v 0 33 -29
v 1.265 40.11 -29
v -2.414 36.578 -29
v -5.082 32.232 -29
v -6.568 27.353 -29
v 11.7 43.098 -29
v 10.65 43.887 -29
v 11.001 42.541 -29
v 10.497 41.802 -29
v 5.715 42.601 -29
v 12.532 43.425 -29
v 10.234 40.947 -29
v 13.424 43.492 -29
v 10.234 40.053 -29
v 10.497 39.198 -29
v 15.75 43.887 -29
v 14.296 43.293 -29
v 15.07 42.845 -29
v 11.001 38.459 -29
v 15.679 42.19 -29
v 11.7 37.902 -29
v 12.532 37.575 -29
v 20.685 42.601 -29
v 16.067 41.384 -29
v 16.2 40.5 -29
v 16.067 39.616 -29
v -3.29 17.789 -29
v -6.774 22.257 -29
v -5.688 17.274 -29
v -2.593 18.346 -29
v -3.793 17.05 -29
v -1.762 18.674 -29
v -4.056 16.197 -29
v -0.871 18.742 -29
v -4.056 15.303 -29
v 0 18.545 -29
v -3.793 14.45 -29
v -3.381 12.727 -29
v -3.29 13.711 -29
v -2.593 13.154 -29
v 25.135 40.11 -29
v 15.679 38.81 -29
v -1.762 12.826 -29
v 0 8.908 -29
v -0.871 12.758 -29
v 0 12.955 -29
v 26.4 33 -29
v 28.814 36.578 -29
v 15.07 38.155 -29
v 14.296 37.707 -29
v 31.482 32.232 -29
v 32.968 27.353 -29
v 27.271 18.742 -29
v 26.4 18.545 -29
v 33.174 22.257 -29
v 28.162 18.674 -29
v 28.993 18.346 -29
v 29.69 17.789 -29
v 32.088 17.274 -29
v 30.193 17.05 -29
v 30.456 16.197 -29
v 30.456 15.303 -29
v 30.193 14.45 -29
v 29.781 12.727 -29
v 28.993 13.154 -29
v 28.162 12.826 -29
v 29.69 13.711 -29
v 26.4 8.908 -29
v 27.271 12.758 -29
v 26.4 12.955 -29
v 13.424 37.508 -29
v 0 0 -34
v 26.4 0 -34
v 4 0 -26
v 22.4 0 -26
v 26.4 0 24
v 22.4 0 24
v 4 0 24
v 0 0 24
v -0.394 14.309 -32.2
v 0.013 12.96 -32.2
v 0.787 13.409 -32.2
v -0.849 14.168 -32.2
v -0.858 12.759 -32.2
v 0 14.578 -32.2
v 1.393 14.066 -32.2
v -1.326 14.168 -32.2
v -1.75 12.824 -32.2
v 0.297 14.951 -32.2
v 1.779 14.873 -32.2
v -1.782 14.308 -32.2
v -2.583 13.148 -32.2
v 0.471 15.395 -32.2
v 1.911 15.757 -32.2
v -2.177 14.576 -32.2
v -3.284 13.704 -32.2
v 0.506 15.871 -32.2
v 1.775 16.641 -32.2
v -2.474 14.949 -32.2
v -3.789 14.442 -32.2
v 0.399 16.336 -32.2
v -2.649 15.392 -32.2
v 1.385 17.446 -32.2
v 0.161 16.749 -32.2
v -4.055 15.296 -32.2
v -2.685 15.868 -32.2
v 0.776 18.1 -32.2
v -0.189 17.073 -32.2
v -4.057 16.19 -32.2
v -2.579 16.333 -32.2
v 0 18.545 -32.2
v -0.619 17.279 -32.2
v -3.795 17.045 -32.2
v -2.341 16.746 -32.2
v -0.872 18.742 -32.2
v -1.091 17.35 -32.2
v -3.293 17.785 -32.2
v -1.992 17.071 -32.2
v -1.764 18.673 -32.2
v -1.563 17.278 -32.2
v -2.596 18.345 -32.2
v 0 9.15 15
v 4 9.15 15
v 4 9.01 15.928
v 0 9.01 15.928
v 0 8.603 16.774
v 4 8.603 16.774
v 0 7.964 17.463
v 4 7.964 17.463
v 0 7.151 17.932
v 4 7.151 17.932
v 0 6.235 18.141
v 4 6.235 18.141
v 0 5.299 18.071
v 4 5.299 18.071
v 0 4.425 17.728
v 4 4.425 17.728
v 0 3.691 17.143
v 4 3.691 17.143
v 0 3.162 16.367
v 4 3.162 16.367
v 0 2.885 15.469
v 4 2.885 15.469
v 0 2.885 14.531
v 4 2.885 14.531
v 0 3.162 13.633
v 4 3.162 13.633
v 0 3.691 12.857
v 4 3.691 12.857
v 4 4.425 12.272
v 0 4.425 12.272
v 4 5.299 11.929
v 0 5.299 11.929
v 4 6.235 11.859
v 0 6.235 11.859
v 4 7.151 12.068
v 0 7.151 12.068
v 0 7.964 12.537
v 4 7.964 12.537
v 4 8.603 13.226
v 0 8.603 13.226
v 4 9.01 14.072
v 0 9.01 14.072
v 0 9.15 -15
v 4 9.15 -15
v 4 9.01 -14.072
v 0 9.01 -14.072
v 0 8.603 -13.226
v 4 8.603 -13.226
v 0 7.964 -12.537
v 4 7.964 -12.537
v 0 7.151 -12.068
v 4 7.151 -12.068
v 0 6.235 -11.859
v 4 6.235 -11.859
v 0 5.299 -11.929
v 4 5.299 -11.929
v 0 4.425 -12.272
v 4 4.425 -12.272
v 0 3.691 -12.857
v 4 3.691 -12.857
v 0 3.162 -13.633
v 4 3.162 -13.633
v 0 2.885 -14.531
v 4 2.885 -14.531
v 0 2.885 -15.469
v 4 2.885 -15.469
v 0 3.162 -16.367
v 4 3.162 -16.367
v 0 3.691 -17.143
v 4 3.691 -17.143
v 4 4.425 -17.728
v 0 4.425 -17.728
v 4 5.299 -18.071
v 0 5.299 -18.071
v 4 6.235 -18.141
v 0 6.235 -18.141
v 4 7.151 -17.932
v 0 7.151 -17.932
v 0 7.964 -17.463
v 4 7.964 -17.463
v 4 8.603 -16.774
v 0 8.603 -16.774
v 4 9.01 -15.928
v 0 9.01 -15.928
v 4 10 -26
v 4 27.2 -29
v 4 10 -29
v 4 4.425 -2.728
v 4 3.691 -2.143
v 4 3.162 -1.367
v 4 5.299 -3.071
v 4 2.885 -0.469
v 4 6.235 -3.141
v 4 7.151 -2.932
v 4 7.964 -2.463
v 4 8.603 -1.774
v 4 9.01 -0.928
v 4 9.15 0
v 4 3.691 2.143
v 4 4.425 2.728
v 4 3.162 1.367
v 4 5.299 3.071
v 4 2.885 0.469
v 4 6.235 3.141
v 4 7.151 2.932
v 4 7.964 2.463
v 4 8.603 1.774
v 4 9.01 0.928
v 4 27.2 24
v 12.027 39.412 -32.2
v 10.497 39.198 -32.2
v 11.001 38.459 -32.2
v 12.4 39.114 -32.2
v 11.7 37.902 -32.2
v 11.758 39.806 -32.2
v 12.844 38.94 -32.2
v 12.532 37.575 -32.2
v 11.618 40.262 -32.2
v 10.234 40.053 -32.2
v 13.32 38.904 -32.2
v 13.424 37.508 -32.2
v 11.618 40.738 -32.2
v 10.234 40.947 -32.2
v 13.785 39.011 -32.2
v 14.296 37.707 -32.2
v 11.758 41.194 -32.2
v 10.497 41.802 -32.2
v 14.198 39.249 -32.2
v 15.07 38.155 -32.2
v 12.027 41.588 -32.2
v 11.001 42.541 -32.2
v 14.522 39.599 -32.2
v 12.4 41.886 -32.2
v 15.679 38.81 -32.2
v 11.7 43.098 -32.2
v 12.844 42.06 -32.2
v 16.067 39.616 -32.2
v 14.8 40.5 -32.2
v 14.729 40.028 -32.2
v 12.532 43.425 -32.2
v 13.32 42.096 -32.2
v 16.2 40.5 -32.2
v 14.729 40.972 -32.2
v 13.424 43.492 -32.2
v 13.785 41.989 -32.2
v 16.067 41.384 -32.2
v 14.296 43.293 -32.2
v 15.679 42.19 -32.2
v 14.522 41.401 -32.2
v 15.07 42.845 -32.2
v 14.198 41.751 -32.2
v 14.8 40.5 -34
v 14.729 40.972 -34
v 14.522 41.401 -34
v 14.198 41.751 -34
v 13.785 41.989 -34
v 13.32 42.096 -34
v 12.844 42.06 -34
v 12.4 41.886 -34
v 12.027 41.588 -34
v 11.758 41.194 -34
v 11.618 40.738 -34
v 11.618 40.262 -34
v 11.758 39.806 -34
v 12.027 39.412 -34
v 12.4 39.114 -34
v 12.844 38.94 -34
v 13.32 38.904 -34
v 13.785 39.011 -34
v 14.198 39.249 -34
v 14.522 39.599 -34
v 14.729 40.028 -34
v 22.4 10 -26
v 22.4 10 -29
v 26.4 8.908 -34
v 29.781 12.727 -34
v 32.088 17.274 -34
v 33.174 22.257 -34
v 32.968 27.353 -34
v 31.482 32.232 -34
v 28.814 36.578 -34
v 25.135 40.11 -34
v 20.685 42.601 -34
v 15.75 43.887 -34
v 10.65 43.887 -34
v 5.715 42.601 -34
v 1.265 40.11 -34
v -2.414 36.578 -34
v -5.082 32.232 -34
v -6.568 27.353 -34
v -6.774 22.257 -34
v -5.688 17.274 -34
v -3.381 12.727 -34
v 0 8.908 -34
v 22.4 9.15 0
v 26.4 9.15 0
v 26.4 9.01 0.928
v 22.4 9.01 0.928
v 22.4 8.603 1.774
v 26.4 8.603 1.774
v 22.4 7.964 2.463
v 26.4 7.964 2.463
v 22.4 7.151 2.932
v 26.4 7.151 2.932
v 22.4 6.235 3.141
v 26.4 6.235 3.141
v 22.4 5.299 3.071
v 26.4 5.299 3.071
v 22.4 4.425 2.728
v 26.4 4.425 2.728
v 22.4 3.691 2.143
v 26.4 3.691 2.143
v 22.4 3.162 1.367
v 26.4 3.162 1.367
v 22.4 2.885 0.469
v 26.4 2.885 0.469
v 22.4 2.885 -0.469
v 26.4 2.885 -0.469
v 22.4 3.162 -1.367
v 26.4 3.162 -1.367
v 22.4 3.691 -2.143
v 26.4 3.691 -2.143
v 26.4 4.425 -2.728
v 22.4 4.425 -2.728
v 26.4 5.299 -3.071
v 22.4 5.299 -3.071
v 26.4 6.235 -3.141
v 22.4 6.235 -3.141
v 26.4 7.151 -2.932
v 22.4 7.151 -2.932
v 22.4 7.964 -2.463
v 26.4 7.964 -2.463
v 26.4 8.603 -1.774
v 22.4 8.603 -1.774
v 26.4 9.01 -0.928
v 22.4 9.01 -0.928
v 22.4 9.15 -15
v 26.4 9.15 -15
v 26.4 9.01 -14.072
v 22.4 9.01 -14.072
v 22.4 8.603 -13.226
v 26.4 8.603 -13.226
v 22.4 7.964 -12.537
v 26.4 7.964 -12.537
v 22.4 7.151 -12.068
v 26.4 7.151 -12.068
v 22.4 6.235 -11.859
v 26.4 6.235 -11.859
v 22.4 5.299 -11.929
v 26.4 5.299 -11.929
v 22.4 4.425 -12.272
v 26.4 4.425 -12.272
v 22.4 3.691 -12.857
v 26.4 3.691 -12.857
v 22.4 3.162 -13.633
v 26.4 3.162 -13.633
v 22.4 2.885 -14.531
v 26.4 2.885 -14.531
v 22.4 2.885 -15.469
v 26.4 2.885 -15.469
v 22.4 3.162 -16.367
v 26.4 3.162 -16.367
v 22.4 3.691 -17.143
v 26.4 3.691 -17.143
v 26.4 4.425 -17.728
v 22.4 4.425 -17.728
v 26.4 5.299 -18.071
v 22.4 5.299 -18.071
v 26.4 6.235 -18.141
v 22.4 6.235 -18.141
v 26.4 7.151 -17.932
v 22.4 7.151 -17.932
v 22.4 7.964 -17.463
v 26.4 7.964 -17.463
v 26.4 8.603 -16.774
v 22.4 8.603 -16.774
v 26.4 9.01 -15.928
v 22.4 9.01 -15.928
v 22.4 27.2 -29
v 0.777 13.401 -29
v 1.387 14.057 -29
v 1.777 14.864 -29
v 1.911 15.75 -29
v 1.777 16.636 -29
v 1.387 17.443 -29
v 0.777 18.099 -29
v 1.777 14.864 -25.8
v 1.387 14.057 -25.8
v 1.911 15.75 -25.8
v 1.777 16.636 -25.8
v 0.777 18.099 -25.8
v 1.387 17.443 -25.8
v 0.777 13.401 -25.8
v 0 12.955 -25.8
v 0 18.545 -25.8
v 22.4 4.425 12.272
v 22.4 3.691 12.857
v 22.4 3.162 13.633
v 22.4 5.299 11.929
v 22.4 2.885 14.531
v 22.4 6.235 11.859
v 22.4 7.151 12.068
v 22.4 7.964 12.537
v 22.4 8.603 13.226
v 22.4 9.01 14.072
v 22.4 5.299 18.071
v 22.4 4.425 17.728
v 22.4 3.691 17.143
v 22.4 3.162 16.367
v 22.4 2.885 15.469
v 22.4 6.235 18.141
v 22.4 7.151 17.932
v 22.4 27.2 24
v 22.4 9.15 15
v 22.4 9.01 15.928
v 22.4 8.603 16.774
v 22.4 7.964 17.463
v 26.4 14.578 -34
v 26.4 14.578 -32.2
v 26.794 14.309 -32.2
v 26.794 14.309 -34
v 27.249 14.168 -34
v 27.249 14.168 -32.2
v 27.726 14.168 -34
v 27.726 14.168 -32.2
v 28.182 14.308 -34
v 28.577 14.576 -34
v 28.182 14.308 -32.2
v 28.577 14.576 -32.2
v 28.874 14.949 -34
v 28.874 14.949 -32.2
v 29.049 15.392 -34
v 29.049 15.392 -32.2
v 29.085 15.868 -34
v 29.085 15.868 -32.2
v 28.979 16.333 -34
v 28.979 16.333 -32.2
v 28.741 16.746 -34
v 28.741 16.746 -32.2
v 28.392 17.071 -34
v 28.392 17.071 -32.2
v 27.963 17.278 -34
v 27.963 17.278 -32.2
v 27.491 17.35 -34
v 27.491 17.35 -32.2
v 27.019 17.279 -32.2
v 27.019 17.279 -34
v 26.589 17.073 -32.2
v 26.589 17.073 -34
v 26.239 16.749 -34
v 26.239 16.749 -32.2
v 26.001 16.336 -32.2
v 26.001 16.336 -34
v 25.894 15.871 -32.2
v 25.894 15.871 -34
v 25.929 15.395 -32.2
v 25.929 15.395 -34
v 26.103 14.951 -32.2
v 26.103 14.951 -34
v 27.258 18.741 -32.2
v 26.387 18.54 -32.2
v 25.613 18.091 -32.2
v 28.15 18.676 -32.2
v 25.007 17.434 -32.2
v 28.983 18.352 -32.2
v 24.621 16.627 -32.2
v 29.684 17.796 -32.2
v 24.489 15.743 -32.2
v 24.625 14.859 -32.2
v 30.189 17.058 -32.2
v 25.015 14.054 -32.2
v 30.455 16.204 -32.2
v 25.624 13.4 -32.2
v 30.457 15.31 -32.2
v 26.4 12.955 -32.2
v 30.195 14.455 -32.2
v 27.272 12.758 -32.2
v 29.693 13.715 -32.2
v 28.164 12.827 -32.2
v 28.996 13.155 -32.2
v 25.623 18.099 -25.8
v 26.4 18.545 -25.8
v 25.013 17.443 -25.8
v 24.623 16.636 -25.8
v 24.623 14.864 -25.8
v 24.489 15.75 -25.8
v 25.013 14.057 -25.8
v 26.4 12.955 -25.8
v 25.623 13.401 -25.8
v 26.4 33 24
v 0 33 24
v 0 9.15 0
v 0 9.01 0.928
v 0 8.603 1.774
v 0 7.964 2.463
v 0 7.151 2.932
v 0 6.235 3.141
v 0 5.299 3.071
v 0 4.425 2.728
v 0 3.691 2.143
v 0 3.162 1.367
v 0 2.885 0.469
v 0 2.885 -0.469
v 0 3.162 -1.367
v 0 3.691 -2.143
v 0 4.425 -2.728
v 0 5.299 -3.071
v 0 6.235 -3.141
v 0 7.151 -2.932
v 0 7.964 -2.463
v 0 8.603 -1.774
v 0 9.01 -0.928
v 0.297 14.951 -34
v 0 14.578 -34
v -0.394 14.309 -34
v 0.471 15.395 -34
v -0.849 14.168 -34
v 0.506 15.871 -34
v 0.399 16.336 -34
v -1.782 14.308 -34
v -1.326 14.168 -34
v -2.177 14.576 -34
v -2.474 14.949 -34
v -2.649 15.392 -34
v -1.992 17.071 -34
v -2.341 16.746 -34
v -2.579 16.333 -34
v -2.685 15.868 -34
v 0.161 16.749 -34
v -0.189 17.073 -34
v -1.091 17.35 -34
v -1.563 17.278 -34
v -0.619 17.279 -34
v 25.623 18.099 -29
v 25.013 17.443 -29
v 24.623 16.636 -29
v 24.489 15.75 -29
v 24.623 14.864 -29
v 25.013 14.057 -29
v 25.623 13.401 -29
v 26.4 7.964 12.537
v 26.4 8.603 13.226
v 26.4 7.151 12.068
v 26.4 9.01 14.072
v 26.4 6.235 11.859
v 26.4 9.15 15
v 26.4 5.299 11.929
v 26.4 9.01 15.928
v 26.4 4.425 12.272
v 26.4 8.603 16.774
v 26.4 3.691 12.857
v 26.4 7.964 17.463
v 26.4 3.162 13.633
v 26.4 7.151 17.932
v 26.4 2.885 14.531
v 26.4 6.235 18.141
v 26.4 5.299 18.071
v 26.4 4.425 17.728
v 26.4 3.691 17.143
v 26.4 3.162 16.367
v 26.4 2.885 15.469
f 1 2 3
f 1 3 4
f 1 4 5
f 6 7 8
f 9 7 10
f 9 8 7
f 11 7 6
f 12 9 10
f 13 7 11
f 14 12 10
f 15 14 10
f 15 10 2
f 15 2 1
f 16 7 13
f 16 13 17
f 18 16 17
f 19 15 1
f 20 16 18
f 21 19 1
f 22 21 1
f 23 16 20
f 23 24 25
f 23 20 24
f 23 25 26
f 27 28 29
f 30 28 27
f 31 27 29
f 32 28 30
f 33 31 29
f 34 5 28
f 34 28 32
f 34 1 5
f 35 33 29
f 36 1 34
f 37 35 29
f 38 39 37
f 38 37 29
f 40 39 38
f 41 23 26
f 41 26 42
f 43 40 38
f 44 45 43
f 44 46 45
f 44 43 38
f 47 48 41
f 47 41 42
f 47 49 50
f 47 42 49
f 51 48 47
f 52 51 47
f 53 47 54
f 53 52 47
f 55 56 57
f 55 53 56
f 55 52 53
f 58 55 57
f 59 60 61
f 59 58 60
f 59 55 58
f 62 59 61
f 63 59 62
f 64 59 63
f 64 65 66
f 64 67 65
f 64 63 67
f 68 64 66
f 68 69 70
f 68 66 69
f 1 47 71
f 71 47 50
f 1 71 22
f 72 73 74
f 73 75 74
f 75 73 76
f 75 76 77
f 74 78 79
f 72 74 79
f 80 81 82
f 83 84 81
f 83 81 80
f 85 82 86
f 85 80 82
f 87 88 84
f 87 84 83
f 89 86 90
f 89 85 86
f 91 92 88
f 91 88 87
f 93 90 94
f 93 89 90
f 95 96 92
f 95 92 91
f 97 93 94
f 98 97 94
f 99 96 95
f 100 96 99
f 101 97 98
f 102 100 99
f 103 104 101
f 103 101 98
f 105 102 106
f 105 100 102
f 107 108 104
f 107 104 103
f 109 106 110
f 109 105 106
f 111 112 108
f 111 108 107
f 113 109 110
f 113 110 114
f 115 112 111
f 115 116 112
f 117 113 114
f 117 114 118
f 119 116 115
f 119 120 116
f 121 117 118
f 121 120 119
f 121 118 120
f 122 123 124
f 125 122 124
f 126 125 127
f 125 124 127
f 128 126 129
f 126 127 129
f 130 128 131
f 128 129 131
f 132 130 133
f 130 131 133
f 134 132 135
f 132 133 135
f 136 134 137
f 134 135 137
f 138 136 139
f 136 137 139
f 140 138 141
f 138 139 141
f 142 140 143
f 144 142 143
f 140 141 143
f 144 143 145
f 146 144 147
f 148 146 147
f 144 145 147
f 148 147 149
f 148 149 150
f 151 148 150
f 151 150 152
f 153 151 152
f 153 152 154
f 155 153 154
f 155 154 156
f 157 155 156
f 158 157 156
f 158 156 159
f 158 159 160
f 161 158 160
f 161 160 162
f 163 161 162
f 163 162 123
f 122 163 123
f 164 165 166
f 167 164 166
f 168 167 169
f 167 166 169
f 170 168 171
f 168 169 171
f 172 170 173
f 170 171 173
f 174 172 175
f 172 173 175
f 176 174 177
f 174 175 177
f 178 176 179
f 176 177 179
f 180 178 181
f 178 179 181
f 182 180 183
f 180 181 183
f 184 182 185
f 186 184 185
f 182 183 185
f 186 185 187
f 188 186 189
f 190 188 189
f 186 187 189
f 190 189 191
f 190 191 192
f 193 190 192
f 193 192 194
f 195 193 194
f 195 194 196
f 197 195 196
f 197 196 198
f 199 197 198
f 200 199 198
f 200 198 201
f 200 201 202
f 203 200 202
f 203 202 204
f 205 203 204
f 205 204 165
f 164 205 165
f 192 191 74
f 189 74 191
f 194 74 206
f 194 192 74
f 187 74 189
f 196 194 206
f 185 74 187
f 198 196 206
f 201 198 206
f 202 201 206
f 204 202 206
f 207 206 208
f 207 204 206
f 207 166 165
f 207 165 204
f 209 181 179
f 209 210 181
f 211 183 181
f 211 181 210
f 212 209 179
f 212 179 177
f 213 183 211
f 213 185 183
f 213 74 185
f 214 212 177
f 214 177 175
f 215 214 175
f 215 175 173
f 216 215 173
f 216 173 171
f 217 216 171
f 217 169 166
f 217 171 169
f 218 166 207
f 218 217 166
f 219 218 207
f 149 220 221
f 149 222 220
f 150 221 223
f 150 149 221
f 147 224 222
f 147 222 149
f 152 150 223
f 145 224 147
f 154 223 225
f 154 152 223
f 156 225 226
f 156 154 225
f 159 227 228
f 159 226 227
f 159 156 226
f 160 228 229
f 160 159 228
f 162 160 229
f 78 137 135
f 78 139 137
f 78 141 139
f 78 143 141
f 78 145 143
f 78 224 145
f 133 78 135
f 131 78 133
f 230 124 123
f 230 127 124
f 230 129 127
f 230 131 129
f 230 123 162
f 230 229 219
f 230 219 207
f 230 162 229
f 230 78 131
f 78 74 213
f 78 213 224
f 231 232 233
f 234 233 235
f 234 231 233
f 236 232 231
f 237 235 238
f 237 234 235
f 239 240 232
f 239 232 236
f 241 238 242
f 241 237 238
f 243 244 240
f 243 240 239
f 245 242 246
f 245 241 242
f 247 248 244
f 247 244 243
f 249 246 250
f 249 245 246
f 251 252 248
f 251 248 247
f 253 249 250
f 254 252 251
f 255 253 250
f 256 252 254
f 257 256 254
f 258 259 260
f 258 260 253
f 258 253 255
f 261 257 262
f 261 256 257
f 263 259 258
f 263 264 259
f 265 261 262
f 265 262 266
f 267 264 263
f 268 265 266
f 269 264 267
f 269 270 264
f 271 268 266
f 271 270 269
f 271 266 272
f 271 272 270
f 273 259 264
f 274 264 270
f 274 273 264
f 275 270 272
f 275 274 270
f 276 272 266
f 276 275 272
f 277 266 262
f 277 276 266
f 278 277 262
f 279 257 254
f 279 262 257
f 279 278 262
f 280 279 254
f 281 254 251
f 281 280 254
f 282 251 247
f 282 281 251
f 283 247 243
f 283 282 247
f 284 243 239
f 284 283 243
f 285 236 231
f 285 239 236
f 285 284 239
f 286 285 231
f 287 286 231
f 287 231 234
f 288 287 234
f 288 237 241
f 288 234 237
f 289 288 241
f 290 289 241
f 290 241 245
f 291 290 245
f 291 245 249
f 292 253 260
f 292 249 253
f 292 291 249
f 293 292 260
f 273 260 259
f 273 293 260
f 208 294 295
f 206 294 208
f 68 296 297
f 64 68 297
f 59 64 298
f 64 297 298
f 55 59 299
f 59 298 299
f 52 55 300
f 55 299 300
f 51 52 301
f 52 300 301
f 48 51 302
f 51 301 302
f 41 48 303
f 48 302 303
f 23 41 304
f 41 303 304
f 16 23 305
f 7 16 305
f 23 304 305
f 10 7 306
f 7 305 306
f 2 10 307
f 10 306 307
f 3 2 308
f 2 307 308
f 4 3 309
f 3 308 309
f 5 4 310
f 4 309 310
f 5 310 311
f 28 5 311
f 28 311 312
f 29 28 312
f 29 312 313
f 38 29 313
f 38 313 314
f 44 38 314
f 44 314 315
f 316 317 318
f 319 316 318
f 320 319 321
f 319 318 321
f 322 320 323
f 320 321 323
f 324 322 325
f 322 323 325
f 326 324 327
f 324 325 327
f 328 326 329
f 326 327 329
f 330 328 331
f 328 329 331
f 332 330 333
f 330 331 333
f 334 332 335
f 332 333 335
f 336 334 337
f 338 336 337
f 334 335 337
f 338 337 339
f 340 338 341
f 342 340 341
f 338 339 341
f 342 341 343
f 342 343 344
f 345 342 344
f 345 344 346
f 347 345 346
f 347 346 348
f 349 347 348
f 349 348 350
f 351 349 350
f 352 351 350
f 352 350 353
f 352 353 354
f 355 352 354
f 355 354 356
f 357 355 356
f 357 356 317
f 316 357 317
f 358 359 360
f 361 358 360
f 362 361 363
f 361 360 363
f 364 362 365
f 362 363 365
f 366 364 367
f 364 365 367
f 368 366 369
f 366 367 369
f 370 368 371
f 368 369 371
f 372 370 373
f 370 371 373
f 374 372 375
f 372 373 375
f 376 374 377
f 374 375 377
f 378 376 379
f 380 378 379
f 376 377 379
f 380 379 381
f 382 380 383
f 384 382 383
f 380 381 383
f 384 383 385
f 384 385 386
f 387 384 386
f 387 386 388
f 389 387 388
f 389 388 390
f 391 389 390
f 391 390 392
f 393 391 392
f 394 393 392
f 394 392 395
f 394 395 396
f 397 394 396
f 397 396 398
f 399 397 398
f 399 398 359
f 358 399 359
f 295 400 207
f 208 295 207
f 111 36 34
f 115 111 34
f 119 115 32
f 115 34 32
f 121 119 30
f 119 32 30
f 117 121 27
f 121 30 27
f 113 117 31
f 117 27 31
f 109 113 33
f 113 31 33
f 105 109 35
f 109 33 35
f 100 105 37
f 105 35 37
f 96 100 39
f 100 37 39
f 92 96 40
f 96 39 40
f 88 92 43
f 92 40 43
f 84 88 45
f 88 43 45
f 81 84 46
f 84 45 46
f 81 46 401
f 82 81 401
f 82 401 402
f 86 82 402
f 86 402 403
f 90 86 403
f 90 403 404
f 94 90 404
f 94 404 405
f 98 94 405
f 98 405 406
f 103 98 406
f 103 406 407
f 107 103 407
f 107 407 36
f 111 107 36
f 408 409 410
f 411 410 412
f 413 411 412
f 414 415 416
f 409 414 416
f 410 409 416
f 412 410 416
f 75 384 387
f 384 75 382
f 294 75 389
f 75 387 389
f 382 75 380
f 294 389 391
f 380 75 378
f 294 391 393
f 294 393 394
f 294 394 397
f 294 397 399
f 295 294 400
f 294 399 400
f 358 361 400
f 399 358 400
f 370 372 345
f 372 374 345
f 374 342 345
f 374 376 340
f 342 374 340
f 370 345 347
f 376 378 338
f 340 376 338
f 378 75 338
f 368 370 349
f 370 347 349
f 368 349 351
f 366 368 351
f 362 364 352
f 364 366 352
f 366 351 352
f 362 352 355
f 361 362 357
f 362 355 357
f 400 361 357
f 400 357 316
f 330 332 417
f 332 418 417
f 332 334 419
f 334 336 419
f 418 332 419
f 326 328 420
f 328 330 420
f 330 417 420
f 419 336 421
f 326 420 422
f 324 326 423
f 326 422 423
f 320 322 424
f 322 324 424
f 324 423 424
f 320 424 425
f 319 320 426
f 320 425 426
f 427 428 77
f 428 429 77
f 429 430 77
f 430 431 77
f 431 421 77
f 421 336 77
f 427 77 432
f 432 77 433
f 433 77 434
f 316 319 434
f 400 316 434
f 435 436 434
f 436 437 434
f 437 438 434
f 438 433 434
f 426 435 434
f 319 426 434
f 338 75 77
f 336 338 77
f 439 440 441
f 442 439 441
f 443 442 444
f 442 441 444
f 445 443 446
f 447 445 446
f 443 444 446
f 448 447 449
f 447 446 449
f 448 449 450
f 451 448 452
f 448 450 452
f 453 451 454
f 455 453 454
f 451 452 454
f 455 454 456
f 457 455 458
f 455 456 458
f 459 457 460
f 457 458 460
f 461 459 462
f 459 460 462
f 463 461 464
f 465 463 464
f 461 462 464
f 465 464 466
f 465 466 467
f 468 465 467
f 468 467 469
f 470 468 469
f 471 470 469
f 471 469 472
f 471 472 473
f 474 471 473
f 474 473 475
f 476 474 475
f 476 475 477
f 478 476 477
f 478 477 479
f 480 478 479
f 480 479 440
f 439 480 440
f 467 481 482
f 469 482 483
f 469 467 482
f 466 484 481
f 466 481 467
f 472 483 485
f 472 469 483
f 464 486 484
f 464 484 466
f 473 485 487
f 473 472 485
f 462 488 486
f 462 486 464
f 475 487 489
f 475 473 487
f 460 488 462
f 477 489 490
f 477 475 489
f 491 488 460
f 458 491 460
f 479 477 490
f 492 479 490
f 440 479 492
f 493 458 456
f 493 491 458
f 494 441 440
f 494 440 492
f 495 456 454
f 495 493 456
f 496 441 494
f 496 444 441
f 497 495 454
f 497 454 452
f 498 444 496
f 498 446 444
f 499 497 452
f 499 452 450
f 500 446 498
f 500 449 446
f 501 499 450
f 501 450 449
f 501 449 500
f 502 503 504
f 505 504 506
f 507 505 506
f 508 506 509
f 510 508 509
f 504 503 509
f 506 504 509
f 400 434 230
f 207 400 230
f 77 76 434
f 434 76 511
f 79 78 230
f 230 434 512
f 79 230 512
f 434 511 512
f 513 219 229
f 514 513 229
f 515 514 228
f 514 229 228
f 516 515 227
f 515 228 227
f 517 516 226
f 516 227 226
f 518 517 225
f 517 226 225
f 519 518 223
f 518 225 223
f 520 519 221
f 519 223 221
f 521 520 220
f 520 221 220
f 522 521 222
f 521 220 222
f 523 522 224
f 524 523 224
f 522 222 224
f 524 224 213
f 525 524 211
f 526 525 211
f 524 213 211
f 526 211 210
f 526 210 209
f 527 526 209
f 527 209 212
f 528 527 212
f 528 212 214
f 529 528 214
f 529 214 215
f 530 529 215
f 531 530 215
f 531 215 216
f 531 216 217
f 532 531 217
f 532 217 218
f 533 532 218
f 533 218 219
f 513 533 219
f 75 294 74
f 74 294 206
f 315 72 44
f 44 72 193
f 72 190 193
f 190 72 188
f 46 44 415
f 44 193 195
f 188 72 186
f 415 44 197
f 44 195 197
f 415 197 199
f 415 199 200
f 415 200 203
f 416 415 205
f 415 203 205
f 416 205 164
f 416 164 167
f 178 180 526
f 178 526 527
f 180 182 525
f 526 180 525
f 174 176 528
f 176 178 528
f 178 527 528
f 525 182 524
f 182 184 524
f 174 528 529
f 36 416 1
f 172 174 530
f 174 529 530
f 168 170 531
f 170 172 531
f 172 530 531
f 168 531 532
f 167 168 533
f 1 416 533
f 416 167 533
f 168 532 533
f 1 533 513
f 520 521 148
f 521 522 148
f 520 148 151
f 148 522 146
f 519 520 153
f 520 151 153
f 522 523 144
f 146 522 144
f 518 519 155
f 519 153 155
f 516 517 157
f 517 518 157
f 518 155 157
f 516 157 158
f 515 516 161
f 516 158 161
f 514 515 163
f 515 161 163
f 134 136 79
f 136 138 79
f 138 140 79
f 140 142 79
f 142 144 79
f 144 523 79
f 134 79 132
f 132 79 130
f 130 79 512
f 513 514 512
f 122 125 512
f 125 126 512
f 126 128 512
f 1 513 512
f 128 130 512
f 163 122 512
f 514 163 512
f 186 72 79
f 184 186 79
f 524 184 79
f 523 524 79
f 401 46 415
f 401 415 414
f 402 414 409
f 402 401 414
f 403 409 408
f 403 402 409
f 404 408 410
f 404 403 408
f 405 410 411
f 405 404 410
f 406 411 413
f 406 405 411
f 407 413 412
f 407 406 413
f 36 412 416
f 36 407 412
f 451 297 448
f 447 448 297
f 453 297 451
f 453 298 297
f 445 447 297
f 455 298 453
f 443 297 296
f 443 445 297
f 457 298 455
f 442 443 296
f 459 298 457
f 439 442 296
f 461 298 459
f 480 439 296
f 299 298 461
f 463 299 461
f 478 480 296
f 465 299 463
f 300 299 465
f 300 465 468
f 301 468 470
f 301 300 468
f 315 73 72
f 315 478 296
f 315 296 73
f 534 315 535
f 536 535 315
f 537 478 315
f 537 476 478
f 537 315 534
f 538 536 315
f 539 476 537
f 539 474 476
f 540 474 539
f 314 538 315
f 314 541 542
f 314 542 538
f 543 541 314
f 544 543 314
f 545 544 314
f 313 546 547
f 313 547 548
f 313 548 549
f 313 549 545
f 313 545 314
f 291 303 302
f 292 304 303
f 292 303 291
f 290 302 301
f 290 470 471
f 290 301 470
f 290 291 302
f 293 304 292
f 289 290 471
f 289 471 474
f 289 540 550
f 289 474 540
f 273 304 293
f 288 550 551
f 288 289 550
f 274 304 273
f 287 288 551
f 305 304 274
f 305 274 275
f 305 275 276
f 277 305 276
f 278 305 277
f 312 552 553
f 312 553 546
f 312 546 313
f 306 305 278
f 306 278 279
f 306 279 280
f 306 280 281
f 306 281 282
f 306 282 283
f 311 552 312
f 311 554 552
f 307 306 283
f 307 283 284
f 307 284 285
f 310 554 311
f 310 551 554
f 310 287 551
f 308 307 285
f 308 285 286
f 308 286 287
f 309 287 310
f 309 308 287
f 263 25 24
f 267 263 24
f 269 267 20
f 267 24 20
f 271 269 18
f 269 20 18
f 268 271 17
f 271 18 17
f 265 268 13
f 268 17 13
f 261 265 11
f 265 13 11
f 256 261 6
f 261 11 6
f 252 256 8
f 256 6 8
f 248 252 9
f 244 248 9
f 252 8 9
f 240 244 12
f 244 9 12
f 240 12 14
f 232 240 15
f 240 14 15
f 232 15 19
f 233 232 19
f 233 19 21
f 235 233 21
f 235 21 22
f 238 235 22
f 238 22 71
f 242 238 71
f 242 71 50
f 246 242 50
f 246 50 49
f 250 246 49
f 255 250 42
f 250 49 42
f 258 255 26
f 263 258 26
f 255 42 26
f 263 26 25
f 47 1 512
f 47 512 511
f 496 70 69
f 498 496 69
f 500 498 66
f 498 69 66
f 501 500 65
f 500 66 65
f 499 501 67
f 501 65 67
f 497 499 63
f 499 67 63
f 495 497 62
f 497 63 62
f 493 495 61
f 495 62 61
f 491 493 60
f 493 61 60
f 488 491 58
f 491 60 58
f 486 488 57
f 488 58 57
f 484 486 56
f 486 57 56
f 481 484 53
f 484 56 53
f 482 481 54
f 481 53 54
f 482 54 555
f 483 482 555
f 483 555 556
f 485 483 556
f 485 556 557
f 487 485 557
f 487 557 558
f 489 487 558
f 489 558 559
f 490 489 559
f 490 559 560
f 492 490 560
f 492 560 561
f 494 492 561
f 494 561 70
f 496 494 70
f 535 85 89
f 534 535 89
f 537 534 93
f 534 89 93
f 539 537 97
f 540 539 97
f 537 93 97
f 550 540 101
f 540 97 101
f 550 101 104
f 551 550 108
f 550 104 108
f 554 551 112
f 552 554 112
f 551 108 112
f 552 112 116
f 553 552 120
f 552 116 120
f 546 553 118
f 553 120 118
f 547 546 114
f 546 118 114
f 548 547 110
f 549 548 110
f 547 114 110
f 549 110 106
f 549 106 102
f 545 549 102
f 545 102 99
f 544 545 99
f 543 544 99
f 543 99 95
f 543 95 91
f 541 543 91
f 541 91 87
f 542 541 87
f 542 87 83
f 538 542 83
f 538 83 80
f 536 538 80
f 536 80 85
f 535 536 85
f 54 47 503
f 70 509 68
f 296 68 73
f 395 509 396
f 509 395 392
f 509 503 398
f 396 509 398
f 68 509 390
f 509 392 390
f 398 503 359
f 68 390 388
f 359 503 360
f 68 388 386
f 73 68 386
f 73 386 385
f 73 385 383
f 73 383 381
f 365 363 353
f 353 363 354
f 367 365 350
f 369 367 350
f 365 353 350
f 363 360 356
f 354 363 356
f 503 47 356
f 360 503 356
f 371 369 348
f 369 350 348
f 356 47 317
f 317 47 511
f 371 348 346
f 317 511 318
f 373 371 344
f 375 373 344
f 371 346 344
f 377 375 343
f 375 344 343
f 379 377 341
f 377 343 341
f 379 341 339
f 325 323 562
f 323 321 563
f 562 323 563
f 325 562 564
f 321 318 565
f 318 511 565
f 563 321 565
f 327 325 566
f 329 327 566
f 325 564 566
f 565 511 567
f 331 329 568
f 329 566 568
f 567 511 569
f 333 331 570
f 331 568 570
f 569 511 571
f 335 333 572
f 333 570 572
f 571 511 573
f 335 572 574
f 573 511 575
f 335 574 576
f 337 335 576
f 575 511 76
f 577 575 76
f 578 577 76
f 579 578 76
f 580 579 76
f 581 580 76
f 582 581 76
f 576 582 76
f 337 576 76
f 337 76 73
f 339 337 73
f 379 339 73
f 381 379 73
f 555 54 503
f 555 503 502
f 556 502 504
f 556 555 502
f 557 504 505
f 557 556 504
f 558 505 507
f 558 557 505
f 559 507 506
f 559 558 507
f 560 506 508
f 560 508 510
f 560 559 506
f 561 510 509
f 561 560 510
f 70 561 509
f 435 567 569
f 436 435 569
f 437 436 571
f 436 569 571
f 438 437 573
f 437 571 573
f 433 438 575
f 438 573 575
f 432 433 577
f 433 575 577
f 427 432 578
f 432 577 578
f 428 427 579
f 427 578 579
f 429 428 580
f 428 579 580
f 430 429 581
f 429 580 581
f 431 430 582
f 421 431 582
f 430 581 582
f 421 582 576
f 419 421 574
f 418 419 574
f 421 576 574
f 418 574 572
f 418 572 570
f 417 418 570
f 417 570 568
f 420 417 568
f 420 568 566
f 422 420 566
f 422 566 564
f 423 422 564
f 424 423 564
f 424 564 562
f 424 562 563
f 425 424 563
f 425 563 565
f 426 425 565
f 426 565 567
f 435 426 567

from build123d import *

# Parameters (mm, degrees)
EXTRUDE_1_DEPTH          = 24
CUT_EXTRUDE_2_REACH      = 50.6
SKETCH_3_R               = 3.15
SKETCH_4_W               = 18.4
SKETCH_4_H               = 17.2
SKETCH_4_H_2             = 10
EXTRUDE_2_DEPTH          = 10
SKETCH_4_3_W             = 18.4
SKETCH_4_3_H             = 17.2
CUT_EXTRUDE_4_DEPTH      = 5
SKETCH_4_5_W             = 18.4
SKETCH_4_5_H             = 10
CUT_EXTRUDE_6_DEPTH      = 2
SKETCH_2_R               = 20.05
SKETCH_2_R_2             = 1.6
EXTRUDE_3_DEPTH          = 5
SKETCH_7_R               = 1.6
CUT_EXTRUDE_7_DEPTH      = 77.51774304
SKETCH_8_R               = 3
CUT_EXTRUDE_8_DEPTH      = 3.2
CUT_EXTRUDE_8_DEPTH_BACK = 3.2


with BuildPart() as part:
    # 草圖1 → 填料-伸長1 (new, symmetric)
    with BuildSketch(Plane.XY):
        Polygon((0, 0), (0, 33), (26.4, 33), (26.4, 0), (22.4, 0), (22.4, 27.2), (4, 27.2), (4, 0), align=None)
    extrude(amount=EXTRUDE_1_DEPTH, both=True)

    # 除料-伸長2: up to this face of the body (flat: up to its plane)
    cut_extrude_2_end = Plane(part.part.faces().sort_by_distance((0, 16.5, 0))[0])
    # 草圖3 → 除料-伸長2 (cut, up to the picked face)
    with BuildSketch(Plane(origin=(26.4, 0, 0), x_dir=(0, 0, -1), z_dir=(1, 0, 0)), mode=Mode.PRIVATE) as cut_extrude_2_sk1:
        with Locations(Location((0, 6, 0), (0, 0, 90))):
            Circle(SKETCH_3_R)
    cut_extrude_2_tool1 = split(extrude(cut_extrude_2_sk1.sketch, amount=-CUT_EXTRUDE_2_REACH, mode=Mode.PRIVATE), bisect_by=cut_extrude_2_end, keep=Keep.BOTH, mode=Mode.PRIVATE)
    # 草圖3 → 除料-伸長2 (cut, up to the picked face)
    with BuildSketch(Plane(origin=(26.4, 0, 0), x_dir=(0, 0, -1), z_dir=(1, 0, 0)), mode=Mode.PRIVATE) as cut_extrude_2_sk2:
        with Locations(Location((15, 6, 0), (0, 0, 90))):
            Circle(SKETCH_3_R)
    cut_extrude_2_tool2 = split(extrude(cut_extrude_2_sk2.sketch, amount=-CUT_EXTRUDE_2_REACH, mode=Mode.PRIVATE), bisect_by=cut_extrude_2_end, keep=Keep.BOTH, mode=Mode.PRIVATE)
    # 草圖3 → 除料-伸長2 (cut, up to the picked face)
    with BuildSketch(Plane(origin=(26.4, 0, 0), x_dir=(0, 0, -1), z_dir=(1, 0, 0)), mode=Mode.PRIVATE) as cut_extrude_2_sk3:
        with Locations(Location((-15, 6, 0), (0, 0, 90))):
            Circle(SKETCH_3_R)
    cut_extrude_2_tool3 = split(extrude(cut_extrude_2_sk3.sketch, amount=-CUT_EXTRUDE_2_REACH, mode=Mode.PRIVATE), bisect_by=cut_extrude_2_end, keep=Keep.BOTH, mode=Mode.PRIVATE)
    add(cut_extrude_2_tool1.solids().sort_by(Axis((26.4, 6, 0), (-1, 0, 0)))[0], mode=Mode.SUBTRACT)
    add(cut_extrude_2_tool2.solids().sort_by(Axis((26.4, 6, -15), (-1, 0, 0)))[0], mode=Mode.SUBTRACT)
    add(cut_extrude_2_tool3.solids().sort_by(Axis((26.4, 6, 15), (-1, 0, 0)))[0], mode=Mode.SUBTRACT)

    # 草圖4 → 填料-伸長2 (add)
    with BuildSketch(Plane(origin=(0, 0, -24), x_dir=(-1, 0, 0), z_dir=(0, 0, -1))):
        Polygon((-4, 27.2), (-4, 0), (0, 0), (0, 33), (-26.4, 33), (-26.4, 0), (-22.4, 0), (-22.4, 27.2), align=None)
        with Locations((-13.2, 18.6)):
            Rectangle(SKETCH_4_W, SKETCH_4_H)
        with Locations((-13.2, 5)):
            Rectangle(SKETCH_4_W, SKETCH_4_H_2)
    extrude(amount=EXTRUDE_2_DEPTH)

    # 草圖4<3> → 除料-伸長4 (cut)
    with BuildSketch(Plane(origin=(0, 0, -24), x_dir=(-1, 0, 0), z_dir=(0, 0, -1))):
        with Locations((-13.2, 18.6)):
            Rectangle(SKETCH_4_3_W, SKETCH_4_3_H)
    extrude(amount=CUT_EXTRUDE_4_DEPTH, mode=Mode.SUBTRACT)

    # 草圖4<5> → 除料-伸長6 (cut)
    with BuildSketch(Plane(origin=(0, 0, -24), x_dir=(-1, 0, 0), z_dir=(0, 0, -1))):
        with Locations((-13.2, 5)):
            Rectangle(SKETCH_4_5_W, SKETCH_4_5_H)
    extrude(amount=CUT_EXTRUDE_6_DEPTH, mode=Mode.SUBTRACT)

    # 草圖2 → 填料-伸長3 (add)
    with BuildSketch(Plane(origin=(60.4, 53.6, -34), x_dir=(0, -1, 0), z_dir=(0, 0, 1))):
        with Locations((29.6, -47.2)):
            Circle(SKETCH_2_R)
        with Locations(Location((13.1, -47.2, 0), (0, 0, 90))):
            Circle(SKETCH_2_R_2, mode=Mode.SUBTRACT)
        with Locations((37.85, -32.910580838)):
            Circle(SKETCH_2_R_2, mode=Mode.SUBTRACT)
        with Locations((37.85, -61.489419162)):
            Circle(SKETCH_2_R_2, mode=Mode.SUBTRACT)
    extrude(amount=EXTRUDE_3_DEPTH)

    # 草圖7 → 除料-伸長7 (cut, through all)
    with BuildSketch(Plane.XY.offset(-29)):
        with Locations(Location((27.489419162, 15.75, 0), (0, 0, 227.087006542))):
            Circle(SKETCH_7_R)
        with Locations(Location((-1.089419162, 15.75, 0), (0, 0, 312.912993458))):
            Circle(SKETCH_7_R)
    extrude(amount=-CUT_EXTRUDE_7_DEPTH, mode=Mode.SUBTRACT)

    # 草圖8 → 除料-伸長8 (cut, two sides)
    with BuildSketch(Plane.XY.offset(-29)) as cut_extrude_8_sk:
        with Locations(Location((-1.089419162, 15.75, 0), (0, 0, 68.706857297))):
            Circle(SKETCH_8_R)
        with Locations(Location((27.489419162, 15.75, 0), (0, 0, 248.706857297))):
            Circle(SKETCH_8_R)
        with Locations((13.2, 40.5)):
            Circle(SKETCH_8_R)
    extrude(amount=CUT_EXTRUDE_8_DEPTH, mode=Mode.SUBTRACT)
    extrude(cut_extrude_8_sk.sketch, amount=-CUT_EXTRUDE_8_DEPTH_BACK, mode=Mode.SUBTRACT)


solid = part.part
